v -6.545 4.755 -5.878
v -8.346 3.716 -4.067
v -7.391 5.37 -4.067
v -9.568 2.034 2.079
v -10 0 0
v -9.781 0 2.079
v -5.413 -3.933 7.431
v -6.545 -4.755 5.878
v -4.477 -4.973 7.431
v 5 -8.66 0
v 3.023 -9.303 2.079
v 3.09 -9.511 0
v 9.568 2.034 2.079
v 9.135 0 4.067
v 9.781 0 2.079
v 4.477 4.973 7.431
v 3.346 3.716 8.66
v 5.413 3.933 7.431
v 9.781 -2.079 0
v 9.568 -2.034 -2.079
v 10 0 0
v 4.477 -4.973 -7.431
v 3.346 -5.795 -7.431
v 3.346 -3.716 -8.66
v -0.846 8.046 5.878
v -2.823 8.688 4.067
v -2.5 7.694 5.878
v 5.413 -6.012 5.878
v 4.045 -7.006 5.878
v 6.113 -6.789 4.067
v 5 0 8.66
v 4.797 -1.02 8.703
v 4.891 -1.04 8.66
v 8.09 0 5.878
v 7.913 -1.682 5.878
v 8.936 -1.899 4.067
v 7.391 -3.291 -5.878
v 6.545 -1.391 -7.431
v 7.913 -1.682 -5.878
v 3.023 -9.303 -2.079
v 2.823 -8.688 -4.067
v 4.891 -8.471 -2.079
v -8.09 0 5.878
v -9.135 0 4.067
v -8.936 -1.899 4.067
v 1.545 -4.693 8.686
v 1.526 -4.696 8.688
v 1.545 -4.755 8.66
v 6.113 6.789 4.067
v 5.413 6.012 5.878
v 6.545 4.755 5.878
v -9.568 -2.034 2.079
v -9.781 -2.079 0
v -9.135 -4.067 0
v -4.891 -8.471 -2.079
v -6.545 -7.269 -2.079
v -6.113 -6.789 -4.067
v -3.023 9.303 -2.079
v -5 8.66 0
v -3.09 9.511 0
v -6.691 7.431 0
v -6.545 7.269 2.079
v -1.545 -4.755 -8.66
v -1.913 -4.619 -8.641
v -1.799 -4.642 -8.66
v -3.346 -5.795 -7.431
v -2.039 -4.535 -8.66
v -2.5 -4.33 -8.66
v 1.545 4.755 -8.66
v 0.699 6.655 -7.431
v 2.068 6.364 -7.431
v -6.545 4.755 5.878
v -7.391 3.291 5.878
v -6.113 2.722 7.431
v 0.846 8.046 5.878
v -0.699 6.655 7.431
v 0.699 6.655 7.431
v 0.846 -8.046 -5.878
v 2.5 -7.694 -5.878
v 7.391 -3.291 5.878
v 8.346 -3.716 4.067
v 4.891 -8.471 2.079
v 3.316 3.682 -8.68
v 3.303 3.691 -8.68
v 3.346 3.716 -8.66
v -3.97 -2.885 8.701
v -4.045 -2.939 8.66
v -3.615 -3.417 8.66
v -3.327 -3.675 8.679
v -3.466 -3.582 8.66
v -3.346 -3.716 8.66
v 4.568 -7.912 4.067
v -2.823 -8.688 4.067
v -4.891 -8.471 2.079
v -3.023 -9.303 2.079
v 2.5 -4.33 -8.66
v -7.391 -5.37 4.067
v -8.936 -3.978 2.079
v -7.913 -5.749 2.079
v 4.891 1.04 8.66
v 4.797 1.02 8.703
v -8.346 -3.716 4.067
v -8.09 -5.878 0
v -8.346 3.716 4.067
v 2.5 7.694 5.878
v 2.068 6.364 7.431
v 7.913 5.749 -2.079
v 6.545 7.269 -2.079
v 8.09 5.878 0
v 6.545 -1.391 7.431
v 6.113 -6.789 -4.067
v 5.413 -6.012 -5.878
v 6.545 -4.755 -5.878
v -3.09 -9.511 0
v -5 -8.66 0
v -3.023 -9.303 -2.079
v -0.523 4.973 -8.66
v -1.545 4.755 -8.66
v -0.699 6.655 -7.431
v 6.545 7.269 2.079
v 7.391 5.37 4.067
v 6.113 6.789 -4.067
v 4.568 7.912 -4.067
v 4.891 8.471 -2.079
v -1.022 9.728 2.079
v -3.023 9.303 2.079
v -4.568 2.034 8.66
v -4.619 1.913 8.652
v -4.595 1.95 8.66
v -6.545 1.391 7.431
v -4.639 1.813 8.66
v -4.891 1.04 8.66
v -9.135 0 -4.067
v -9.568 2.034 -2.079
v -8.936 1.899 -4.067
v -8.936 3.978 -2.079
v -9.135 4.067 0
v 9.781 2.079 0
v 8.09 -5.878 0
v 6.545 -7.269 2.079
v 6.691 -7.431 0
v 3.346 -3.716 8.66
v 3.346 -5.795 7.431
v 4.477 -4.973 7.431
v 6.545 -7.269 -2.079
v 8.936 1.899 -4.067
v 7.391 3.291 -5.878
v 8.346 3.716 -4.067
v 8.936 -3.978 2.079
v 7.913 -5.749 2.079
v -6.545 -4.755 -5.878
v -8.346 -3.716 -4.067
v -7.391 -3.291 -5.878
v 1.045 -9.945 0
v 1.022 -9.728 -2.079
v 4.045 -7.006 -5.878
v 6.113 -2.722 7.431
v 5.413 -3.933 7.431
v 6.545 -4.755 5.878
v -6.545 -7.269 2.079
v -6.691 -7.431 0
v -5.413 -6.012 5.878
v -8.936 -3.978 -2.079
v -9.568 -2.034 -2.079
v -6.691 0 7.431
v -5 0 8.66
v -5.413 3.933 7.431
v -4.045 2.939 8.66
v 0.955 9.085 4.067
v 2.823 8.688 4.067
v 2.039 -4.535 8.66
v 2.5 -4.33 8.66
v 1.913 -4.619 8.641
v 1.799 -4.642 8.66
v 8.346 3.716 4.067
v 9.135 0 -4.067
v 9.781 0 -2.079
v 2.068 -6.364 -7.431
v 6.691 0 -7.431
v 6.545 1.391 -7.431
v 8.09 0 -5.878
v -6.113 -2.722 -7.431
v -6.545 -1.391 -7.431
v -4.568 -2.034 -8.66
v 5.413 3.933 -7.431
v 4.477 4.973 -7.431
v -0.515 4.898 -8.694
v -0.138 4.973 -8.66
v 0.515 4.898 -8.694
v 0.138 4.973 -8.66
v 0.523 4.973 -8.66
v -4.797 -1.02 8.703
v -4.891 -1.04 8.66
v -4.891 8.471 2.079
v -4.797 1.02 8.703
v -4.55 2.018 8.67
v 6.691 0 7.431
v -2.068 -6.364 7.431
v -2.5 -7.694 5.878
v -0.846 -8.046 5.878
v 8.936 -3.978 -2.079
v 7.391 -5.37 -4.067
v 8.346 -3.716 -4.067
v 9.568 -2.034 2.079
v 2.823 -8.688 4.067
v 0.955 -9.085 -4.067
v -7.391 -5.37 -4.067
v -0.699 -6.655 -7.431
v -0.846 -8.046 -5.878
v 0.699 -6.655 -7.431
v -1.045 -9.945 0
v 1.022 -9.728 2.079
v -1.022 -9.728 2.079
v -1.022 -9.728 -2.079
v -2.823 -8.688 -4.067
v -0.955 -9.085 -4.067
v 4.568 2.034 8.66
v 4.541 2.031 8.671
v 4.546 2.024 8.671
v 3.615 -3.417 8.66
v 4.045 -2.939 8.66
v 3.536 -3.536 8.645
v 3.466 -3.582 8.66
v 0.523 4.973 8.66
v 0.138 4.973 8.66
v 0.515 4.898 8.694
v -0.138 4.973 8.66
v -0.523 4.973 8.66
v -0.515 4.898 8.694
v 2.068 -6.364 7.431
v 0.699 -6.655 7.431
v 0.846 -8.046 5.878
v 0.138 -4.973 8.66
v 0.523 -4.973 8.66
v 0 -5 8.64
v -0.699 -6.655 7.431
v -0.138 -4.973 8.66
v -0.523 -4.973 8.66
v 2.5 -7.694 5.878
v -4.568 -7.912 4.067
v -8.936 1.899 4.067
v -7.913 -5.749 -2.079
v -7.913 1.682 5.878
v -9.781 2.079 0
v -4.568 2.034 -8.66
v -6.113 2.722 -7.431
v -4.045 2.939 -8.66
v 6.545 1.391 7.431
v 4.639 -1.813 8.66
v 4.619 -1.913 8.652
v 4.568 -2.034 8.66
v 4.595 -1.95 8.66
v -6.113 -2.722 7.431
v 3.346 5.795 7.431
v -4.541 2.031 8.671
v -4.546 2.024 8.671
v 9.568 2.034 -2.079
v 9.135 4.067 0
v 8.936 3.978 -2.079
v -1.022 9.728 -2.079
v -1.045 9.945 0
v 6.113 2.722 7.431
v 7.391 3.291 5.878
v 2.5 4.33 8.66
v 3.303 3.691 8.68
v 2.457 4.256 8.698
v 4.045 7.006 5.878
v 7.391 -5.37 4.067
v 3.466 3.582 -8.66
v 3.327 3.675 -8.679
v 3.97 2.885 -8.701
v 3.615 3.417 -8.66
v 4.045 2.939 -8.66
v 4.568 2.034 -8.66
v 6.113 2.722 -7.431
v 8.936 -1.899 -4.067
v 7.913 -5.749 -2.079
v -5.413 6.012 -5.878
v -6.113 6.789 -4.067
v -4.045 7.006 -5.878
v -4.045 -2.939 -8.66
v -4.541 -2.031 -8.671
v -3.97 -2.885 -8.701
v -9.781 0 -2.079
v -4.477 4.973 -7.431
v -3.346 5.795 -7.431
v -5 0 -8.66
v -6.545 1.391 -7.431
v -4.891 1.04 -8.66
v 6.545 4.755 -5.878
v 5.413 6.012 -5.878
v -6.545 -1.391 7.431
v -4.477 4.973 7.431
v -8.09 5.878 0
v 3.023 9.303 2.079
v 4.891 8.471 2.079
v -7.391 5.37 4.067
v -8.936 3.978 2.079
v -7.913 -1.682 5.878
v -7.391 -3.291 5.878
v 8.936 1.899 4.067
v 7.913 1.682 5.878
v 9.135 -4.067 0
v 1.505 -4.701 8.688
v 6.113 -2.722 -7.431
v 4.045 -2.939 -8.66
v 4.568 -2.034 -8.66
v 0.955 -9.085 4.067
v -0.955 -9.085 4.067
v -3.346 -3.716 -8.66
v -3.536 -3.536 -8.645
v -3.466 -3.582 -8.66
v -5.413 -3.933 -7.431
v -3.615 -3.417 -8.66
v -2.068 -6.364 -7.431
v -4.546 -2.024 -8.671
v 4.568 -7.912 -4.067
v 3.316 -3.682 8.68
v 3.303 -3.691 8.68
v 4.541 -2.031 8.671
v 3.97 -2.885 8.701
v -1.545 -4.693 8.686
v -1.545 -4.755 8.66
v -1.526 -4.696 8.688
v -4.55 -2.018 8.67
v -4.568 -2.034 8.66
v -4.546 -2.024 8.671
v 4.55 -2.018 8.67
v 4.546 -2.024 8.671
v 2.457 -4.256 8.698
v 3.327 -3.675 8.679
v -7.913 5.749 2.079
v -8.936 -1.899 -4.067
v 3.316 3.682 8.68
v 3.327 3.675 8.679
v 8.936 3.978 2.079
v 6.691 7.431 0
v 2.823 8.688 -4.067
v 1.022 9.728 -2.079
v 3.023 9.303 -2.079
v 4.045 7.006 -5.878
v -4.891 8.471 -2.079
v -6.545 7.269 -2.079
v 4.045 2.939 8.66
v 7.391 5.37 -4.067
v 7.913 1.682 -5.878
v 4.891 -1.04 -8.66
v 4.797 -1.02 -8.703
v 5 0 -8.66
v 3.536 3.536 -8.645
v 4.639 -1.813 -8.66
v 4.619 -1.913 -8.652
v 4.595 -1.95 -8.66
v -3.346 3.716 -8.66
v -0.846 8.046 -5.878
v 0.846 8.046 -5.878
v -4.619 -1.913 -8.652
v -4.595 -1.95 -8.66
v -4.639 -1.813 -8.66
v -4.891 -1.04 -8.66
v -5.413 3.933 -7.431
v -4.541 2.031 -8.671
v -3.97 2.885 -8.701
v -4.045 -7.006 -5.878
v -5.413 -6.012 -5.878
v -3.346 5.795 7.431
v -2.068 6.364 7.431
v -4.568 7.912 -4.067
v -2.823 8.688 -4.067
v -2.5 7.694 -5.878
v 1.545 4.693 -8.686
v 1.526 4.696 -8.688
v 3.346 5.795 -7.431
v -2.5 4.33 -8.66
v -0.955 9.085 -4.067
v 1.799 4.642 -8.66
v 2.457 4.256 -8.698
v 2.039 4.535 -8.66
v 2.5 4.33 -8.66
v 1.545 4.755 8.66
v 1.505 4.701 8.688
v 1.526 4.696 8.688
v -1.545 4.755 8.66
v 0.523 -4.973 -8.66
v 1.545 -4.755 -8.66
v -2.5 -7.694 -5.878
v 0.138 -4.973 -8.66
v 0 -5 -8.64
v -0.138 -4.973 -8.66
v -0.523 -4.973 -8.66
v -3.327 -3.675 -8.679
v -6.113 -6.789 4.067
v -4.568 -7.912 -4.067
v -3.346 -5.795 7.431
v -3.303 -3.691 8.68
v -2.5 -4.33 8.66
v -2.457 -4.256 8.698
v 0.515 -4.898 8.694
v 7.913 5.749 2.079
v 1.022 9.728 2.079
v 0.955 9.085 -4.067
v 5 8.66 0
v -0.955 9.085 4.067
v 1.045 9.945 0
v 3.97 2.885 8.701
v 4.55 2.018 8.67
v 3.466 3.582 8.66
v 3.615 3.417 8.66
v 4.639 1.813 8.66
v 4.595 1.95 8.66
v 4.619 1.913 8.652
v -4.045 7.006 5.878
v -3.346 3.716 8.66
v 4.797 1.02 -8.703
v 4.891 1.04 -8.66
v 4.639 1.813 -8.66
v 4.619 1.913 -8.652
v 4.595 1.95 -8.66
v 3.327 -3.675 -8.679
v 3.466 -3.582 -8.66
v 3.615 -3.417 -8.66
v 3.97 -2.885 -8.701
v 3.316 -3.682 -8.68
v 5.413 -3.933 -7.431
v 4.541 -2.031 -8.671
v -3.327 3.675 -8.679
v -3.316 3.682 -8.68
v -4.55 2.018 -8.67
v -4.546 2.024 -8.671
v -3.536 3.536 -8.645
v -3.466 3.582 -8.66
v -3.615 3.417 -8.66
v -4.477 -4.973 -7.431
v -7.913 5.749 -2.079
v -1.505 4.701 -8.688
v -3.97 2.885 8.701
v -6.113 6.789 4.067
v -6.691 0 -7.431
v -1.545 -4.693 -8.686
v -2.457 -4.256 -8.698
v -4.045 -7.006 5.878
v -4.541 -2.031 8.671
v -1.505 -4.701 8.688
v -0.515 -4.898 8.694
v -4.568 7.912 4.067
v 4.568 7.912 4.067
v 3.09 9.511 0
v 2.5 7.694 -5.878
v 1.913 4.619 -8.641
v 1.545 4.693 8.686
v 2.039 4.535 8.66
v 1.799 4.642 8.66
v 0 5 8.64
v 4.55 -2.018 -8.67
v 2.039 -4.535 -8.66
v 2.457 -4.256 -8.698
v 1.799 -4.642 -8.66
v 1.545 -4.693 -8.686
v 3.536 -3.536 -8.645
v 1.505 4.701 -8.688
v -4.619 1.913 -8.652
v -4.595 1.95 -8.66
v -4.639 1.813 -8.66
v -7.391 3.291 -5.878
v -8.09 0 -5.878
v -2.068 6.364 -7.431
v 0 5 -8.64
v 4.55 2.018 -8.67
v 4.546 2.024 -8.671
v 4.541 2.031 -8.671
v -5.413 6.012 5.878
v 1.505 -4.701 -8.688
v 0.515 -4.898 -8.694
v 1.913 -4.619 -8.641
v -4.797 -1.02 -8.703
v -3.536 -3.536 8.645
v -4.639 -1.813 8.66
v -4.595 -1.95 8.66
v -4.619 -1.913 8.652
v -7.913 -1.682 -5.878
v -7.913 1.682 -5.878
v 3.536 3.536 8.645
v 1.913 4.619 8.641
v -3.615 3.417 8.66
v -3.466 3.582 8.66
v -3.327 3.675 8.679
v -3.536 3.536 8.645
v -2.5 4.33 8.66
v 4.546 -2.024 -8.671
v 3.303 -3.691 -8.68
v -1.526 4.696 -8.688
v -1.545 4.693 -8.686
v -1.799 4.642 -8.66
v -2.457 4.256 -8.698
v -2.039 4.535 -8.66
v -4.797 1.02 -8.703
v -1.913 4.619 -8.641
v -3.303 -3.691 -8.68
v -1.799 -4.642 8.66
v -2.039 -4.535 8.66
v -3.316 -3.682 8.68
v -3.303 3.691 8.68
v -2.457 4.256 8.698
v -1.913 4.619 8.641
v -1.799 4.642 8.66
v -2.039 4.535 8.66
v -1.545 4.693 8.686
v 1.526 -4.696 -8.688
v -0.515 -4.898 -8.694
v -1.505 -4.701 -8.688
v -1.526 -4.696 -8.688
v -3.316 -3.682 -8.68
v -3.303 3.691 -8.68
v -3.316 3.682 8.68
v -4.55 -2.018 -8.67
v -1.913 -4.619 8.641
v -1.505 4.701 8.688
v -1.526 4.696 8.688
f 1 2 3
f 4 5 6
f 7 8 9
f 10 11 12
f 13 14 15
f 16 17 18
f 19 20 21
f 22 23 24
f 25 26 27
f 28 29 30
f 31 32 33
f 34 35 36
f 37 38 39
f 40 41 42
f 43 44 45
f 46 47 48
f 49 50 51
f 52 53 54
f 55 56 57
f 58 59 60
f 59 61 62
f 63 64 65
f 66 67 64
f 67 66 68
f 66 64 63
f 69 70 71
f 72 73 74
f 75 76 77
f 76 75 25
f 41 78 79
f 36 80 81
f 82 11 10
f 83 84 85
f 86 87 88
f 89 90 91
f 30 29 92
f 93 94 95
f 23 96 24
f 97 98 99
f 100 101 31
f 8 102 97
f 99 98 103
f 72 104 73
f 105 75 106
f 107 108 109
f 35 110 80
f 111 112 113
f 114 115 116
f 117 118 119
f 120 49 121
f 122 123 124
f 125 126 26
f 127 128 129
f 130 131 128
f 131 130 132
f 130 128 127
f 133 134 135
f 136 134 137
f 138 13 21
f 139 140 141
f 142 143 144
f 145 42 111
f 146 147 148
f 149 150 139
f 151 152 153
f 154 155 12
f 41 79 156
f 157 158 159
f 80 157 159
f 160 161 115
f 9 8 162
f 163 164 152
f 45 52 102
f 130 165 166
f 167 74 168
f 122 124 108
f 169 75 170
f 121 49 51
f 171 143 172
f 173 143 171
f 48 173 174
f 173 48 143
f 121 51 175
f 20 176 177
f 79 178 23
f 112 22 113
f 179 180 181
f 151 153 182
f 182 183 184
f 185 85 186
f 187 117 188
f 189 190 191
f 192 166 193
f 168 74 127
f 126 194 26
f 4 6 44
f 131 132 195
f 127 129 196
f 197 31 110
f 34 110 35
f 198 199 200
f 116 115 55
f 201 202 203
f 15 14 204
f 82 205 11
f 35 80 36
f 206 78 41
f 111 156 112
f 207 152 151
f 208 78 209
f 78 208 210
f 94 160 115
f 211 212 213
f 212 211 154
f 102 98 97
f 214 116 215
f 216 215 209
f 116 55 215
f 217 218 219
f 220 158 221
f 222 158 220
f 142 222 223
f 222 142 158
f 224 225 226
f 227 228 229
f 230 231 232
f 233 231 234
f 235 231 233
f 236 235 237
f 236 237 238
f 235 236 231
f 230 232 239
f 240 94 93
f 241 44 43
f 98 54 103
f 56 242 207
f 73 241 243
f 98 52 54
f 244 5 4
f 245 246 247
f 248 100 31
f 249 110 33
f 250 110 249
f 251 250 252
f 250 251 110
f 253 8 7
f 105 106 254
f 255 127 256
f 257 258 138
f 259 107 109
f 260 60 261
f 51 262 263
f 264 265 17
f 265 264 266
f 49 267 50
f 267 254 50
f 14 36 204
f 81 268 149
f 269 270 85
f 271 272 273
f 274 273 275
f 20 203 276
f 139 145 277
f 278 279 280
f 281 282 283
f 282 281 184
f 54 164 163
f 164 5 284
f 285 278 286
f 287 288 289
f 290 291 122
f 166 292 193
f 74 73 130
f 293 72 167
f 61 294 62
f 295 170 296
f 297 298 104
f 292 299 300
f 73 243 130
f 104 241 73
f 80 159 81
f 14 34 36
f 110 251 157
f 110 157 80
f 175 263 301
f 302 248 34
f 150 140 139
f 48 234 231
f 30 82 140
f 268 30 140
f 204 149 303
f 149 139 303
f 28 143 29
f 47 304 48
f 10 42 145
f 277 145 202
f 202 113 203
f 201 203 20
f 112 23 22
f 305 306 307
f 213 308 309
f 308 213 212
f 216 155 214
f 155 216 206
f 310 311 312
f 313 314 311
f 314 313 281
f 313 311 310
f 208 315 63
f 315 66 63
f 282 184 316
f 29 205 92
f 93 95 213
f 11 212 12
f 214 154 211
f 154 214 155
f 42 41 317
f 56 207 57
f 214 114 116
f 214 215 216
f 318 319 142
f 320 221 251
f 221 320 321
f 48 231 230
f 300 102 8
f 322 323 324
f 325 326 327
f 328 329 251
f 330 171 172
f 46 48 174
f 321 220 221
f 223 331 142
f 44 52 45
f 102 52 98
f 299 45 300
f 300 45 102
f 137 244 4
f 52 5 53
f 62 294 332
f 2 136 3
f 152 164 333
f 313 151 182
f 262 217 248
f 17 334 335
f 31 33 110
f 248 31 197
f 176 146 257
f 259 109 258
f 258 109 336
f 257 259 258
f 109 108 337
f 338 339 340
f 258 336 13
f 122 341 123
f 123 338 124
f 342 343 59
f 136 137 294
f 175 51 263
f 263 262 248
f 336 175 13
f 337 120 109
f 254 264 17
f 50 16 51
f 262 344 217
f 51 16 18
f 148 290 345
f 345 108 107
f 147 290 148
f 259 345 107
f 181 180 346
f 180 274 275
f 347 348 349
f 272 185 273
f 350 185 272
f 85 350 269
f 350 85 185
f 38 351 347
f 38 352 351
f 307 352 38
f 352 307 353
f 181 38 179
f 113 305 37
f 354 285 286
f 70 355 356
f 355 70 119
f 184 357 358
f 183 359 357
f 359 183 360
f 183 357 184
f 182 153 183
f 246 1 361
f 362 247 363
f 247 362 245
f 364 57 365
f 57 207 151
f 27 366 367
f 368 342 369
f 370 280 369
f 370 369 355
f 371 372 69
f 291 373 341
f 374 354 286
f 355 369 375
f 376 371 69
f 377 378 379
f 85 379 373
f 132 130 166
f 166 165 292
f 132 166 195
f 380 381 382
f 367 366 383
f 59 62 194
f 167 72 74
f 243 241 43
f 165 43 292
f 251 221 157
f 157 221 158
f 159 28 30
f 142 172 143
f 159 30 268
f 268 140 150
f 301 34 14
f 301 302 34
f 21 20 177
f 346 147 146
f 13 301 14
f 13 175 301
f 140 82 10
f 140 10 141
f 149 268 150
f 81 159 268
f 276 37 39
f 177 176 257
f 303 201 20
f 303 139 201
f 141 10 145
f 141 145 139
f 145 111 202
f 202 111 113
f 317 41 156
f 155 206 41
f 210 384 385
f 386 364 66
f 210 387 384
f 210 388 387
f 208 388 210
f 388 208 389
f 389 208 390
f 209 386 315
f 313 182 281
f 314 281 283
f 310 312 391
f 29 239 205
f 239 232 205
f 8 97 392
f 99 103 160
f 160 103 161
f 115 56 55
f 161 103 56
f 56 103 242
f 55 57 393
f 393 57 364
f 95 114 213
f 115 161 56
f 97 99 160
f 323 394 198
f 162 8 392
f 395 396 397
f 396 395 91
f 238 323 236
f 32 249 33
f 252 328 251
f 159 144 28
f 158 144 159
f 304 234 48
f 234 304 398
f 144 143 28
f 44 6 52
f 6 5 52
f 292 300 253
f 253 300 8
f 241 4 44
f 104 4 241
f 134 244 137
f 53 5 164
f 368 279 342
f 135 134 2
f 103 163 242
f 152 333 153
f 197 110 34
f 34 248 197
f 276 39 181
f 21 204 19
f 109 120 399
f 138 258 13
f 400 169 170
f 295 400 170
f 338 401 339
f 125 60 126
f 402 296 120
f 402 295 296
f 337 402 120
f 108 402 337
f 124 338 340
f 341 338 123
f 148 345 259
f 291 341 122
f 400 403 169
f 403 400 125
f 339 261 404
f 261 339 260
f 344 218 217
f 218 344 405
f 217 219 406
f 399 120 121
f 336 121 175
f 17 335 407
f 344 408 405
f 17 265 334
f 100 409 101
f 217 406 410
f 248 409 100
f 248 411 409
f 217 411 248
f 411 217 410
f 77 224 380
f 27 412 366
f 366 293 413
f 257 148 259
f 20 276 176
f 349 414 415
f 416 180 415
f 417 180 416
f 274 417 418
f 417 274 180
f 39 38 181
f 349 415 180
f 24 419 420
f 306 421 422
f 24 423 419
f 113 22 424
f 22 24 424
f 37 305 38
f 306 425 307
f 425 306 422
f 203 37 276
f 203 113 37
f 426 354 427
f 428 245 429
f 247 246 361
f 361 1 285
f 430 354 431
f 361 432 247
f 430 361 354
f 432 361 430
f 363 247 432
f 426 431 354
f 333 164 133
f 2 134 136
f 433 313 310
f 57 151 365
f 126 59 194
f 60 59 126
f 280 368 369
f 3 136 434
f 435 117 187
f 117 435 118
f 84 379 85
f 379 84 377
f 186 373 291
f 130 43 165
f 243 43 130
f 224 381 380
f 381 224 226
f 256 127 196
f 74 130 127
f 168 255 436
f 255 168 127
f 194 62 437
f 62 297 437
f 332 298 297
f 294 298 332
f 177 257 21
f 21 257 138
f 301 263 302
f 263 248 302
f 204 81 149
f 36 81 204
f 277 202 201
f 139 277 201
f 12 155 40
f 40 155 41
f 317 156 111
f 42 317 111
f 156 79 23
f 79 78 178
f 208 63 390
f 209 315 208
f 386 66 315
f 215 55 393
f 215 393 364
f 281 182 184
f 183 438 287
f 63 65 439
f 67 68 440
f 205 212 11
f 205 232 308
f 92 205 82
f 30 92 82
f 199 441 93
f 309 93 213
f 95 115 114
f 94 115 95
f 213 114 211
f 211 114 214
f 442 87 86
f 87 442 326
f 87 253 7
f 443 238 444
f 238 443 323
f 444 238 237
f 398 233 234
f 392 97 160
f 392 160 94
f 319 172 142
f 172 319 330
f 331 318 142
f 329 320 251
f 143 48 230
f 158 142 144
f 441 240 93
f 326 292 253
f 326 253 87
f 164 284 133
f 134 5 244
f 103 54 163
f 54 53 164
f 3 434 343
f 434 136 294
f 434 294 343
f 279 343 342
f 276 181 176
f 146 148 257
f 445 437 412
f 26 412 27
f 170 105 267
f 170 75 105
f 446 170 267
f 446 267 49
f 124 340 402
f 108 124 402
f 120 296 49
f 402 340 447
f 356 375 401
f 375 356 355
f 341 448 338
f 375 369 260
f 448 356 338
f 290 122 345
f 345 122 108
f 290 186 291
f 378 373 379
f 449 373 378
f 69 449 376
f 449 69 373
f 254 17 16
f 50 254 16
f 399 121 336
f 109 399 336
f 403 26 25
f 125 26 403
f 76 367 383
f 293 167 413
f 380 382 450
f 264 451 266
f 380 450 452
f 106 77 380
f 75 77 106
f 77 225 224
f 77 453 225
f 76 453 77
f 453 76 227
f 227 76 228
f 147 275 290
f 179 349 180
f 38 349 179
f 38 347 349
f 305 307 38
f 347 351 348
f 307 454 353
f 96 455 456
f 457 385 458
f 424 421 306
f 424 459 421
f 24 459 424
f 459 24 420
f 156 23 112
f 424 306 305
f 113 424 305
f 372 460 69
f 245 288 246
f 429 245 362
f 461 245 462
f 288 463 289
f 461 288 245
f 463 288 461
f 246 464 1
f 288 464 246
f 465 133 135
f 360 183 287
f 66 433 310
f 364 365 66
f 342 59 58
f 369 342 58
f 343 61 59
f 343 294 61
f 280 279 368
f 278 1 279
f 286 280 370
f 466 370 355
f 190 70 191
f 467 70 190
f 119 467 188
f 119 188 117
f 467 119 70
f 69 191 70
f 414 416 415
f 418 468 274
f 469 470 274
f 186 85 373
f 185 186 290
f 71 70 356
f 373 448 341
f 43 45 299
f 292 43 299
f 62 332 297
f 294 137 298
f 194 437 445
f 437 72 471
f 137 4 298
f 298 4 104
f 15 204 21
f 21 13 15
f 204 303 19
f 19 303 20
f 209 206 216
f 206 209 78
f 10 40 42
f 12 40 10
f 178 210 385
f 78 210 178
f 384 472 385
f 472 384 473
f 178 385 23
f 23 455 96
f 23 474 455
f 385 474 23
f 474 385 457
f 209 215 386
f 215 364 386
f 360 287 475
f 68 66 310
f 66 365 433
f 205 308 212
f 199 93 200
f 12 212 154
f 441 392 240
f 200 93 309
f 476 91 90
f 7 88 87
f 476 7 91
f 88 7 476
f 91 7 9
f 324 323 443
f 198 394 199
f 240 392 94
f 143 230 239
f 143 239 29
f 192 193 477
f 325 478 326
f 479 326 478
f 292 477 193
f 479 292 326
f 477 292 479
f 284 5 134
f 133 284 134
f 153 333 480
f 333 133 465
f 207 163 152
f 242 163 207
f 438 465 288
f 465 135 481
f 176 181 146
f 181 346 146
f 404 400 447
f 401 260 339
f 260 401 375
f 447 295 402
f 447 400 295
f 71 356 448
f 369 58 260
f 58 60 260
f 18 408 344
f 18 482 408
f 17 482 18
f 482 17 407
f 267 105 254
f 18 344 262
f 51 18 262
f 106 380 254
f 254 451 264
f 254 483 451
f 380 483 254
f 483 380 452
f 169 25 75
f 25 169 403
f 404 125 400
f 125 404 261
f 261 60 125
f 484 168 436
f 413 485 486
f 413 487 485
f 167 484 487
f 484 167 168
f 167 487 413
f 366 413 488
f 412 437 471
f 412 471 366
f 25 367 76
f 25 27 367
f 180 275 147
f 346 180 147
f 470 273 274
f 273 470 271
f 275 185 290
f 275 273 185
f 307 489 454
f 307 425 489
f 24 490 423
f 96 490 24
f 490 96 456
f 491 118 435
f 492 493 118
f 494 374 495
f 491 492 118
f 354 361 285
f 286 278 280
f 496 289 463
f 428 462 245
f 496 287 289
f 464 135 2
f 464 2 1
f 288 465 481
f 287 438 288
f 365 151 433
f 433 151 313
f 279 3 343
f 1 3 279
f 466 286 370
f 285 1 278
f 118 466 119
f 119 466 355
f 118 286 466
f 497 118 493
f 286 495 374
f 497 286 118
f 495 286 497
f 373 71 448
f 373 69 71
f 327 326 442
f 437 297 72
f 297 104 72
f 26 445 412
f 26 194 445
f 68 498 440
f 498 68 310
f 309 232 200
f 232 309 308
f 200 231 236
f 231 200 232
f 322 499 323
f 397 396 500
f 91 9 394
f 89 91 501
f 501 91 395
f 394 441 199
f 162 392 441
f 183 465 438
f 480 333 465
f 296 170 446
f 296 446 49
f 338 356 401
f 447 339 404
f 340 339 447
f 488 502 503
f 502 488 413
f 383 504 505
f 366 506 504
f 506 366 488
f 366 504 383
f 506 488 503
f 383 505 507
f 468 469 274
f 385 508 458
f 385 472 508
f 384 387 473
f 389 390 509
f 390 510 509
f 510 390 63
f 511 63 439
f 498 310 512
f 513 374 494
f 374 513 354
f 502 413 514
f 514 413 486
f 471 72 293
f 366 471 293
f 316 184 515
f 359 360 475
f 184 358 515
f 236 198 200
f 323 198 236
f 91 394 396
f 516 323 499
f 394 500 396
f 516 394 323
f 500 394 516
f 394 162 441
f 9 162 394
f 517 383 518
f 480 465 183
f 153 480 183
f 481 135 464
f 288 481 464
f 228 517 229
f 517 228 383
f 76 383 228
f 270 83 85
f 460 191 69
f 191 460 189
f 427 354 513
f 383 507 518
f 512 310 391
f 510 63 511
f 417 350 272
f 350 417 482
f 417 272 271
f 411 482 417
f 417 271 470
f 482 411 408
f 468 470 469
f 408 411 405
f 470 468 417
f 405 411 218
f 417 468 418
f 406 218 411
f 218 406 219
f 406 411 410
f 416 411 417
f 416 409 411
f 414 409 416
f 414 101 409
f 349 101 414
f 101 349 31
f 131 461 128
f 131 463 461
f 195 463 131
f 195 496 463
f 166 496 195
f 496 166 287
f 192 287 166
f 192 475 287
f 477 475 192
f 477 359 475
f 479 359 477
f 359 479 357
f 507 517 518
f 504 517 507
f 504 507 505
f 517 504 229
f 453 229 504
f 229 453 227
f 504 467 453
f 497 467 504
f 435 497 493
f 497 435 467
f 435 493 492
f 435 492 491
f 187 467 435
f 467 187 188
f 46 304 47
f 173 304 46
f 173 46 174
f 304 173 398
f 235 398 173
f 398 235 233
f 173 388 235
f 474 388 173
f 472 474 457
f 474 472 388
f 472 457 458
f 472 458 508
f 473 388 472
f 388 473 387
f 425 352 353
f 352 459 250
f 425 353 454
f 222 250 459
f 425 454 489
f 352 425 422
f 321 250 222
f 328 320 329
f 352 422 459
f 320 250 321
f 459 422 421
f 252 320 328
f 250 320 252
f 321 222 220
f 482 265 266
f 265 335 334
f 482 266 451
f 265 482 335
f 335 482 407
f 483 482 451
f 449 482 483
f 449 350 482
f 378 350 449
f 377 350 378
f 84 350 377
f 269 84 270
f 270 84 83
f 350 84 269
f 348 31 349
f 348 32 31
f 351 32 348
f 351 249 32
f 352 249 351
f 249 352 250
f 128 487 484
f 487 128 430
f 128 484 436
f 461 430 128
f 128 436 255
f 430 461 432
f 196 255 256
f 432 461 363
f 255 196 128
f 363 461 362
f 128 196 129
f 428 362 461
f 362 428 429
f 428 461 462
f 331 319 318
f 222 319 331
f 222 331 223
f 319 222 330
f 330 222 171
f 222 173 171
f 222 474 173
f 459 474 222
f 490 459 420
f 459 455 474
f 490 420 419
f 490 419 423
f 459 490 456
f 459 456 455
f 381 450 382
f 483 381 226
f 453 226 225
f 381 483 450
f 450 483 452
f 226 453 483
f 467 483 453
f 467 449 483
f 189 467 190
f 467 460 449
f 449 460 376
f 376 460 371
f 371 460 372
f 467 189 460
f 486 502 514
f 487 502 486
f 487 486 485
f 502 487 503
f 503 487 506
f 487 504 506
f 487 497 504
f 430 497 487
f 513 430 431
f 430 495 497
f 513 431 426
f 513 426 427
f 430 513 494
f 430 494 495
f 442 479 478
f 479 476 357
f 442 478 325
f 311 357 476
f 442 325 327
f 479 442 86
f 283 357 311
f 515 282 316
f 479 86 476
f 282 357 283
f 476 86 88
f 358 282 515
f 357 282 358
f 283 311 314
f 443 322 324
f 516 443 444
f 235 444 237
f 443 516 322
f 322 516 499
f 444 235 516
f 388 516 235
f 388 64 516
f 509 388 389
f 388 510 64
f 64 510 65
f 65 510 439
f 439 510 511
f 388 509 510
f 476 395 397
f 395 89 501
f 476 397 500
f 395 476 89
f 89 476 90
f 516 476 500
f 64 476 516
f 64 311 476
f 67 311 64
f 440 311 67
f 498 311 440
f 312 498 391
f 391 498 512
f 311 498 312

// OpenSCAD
difference(){
    sphere(r=10);
    cylinder(r=5, h=30, center=true);
}
